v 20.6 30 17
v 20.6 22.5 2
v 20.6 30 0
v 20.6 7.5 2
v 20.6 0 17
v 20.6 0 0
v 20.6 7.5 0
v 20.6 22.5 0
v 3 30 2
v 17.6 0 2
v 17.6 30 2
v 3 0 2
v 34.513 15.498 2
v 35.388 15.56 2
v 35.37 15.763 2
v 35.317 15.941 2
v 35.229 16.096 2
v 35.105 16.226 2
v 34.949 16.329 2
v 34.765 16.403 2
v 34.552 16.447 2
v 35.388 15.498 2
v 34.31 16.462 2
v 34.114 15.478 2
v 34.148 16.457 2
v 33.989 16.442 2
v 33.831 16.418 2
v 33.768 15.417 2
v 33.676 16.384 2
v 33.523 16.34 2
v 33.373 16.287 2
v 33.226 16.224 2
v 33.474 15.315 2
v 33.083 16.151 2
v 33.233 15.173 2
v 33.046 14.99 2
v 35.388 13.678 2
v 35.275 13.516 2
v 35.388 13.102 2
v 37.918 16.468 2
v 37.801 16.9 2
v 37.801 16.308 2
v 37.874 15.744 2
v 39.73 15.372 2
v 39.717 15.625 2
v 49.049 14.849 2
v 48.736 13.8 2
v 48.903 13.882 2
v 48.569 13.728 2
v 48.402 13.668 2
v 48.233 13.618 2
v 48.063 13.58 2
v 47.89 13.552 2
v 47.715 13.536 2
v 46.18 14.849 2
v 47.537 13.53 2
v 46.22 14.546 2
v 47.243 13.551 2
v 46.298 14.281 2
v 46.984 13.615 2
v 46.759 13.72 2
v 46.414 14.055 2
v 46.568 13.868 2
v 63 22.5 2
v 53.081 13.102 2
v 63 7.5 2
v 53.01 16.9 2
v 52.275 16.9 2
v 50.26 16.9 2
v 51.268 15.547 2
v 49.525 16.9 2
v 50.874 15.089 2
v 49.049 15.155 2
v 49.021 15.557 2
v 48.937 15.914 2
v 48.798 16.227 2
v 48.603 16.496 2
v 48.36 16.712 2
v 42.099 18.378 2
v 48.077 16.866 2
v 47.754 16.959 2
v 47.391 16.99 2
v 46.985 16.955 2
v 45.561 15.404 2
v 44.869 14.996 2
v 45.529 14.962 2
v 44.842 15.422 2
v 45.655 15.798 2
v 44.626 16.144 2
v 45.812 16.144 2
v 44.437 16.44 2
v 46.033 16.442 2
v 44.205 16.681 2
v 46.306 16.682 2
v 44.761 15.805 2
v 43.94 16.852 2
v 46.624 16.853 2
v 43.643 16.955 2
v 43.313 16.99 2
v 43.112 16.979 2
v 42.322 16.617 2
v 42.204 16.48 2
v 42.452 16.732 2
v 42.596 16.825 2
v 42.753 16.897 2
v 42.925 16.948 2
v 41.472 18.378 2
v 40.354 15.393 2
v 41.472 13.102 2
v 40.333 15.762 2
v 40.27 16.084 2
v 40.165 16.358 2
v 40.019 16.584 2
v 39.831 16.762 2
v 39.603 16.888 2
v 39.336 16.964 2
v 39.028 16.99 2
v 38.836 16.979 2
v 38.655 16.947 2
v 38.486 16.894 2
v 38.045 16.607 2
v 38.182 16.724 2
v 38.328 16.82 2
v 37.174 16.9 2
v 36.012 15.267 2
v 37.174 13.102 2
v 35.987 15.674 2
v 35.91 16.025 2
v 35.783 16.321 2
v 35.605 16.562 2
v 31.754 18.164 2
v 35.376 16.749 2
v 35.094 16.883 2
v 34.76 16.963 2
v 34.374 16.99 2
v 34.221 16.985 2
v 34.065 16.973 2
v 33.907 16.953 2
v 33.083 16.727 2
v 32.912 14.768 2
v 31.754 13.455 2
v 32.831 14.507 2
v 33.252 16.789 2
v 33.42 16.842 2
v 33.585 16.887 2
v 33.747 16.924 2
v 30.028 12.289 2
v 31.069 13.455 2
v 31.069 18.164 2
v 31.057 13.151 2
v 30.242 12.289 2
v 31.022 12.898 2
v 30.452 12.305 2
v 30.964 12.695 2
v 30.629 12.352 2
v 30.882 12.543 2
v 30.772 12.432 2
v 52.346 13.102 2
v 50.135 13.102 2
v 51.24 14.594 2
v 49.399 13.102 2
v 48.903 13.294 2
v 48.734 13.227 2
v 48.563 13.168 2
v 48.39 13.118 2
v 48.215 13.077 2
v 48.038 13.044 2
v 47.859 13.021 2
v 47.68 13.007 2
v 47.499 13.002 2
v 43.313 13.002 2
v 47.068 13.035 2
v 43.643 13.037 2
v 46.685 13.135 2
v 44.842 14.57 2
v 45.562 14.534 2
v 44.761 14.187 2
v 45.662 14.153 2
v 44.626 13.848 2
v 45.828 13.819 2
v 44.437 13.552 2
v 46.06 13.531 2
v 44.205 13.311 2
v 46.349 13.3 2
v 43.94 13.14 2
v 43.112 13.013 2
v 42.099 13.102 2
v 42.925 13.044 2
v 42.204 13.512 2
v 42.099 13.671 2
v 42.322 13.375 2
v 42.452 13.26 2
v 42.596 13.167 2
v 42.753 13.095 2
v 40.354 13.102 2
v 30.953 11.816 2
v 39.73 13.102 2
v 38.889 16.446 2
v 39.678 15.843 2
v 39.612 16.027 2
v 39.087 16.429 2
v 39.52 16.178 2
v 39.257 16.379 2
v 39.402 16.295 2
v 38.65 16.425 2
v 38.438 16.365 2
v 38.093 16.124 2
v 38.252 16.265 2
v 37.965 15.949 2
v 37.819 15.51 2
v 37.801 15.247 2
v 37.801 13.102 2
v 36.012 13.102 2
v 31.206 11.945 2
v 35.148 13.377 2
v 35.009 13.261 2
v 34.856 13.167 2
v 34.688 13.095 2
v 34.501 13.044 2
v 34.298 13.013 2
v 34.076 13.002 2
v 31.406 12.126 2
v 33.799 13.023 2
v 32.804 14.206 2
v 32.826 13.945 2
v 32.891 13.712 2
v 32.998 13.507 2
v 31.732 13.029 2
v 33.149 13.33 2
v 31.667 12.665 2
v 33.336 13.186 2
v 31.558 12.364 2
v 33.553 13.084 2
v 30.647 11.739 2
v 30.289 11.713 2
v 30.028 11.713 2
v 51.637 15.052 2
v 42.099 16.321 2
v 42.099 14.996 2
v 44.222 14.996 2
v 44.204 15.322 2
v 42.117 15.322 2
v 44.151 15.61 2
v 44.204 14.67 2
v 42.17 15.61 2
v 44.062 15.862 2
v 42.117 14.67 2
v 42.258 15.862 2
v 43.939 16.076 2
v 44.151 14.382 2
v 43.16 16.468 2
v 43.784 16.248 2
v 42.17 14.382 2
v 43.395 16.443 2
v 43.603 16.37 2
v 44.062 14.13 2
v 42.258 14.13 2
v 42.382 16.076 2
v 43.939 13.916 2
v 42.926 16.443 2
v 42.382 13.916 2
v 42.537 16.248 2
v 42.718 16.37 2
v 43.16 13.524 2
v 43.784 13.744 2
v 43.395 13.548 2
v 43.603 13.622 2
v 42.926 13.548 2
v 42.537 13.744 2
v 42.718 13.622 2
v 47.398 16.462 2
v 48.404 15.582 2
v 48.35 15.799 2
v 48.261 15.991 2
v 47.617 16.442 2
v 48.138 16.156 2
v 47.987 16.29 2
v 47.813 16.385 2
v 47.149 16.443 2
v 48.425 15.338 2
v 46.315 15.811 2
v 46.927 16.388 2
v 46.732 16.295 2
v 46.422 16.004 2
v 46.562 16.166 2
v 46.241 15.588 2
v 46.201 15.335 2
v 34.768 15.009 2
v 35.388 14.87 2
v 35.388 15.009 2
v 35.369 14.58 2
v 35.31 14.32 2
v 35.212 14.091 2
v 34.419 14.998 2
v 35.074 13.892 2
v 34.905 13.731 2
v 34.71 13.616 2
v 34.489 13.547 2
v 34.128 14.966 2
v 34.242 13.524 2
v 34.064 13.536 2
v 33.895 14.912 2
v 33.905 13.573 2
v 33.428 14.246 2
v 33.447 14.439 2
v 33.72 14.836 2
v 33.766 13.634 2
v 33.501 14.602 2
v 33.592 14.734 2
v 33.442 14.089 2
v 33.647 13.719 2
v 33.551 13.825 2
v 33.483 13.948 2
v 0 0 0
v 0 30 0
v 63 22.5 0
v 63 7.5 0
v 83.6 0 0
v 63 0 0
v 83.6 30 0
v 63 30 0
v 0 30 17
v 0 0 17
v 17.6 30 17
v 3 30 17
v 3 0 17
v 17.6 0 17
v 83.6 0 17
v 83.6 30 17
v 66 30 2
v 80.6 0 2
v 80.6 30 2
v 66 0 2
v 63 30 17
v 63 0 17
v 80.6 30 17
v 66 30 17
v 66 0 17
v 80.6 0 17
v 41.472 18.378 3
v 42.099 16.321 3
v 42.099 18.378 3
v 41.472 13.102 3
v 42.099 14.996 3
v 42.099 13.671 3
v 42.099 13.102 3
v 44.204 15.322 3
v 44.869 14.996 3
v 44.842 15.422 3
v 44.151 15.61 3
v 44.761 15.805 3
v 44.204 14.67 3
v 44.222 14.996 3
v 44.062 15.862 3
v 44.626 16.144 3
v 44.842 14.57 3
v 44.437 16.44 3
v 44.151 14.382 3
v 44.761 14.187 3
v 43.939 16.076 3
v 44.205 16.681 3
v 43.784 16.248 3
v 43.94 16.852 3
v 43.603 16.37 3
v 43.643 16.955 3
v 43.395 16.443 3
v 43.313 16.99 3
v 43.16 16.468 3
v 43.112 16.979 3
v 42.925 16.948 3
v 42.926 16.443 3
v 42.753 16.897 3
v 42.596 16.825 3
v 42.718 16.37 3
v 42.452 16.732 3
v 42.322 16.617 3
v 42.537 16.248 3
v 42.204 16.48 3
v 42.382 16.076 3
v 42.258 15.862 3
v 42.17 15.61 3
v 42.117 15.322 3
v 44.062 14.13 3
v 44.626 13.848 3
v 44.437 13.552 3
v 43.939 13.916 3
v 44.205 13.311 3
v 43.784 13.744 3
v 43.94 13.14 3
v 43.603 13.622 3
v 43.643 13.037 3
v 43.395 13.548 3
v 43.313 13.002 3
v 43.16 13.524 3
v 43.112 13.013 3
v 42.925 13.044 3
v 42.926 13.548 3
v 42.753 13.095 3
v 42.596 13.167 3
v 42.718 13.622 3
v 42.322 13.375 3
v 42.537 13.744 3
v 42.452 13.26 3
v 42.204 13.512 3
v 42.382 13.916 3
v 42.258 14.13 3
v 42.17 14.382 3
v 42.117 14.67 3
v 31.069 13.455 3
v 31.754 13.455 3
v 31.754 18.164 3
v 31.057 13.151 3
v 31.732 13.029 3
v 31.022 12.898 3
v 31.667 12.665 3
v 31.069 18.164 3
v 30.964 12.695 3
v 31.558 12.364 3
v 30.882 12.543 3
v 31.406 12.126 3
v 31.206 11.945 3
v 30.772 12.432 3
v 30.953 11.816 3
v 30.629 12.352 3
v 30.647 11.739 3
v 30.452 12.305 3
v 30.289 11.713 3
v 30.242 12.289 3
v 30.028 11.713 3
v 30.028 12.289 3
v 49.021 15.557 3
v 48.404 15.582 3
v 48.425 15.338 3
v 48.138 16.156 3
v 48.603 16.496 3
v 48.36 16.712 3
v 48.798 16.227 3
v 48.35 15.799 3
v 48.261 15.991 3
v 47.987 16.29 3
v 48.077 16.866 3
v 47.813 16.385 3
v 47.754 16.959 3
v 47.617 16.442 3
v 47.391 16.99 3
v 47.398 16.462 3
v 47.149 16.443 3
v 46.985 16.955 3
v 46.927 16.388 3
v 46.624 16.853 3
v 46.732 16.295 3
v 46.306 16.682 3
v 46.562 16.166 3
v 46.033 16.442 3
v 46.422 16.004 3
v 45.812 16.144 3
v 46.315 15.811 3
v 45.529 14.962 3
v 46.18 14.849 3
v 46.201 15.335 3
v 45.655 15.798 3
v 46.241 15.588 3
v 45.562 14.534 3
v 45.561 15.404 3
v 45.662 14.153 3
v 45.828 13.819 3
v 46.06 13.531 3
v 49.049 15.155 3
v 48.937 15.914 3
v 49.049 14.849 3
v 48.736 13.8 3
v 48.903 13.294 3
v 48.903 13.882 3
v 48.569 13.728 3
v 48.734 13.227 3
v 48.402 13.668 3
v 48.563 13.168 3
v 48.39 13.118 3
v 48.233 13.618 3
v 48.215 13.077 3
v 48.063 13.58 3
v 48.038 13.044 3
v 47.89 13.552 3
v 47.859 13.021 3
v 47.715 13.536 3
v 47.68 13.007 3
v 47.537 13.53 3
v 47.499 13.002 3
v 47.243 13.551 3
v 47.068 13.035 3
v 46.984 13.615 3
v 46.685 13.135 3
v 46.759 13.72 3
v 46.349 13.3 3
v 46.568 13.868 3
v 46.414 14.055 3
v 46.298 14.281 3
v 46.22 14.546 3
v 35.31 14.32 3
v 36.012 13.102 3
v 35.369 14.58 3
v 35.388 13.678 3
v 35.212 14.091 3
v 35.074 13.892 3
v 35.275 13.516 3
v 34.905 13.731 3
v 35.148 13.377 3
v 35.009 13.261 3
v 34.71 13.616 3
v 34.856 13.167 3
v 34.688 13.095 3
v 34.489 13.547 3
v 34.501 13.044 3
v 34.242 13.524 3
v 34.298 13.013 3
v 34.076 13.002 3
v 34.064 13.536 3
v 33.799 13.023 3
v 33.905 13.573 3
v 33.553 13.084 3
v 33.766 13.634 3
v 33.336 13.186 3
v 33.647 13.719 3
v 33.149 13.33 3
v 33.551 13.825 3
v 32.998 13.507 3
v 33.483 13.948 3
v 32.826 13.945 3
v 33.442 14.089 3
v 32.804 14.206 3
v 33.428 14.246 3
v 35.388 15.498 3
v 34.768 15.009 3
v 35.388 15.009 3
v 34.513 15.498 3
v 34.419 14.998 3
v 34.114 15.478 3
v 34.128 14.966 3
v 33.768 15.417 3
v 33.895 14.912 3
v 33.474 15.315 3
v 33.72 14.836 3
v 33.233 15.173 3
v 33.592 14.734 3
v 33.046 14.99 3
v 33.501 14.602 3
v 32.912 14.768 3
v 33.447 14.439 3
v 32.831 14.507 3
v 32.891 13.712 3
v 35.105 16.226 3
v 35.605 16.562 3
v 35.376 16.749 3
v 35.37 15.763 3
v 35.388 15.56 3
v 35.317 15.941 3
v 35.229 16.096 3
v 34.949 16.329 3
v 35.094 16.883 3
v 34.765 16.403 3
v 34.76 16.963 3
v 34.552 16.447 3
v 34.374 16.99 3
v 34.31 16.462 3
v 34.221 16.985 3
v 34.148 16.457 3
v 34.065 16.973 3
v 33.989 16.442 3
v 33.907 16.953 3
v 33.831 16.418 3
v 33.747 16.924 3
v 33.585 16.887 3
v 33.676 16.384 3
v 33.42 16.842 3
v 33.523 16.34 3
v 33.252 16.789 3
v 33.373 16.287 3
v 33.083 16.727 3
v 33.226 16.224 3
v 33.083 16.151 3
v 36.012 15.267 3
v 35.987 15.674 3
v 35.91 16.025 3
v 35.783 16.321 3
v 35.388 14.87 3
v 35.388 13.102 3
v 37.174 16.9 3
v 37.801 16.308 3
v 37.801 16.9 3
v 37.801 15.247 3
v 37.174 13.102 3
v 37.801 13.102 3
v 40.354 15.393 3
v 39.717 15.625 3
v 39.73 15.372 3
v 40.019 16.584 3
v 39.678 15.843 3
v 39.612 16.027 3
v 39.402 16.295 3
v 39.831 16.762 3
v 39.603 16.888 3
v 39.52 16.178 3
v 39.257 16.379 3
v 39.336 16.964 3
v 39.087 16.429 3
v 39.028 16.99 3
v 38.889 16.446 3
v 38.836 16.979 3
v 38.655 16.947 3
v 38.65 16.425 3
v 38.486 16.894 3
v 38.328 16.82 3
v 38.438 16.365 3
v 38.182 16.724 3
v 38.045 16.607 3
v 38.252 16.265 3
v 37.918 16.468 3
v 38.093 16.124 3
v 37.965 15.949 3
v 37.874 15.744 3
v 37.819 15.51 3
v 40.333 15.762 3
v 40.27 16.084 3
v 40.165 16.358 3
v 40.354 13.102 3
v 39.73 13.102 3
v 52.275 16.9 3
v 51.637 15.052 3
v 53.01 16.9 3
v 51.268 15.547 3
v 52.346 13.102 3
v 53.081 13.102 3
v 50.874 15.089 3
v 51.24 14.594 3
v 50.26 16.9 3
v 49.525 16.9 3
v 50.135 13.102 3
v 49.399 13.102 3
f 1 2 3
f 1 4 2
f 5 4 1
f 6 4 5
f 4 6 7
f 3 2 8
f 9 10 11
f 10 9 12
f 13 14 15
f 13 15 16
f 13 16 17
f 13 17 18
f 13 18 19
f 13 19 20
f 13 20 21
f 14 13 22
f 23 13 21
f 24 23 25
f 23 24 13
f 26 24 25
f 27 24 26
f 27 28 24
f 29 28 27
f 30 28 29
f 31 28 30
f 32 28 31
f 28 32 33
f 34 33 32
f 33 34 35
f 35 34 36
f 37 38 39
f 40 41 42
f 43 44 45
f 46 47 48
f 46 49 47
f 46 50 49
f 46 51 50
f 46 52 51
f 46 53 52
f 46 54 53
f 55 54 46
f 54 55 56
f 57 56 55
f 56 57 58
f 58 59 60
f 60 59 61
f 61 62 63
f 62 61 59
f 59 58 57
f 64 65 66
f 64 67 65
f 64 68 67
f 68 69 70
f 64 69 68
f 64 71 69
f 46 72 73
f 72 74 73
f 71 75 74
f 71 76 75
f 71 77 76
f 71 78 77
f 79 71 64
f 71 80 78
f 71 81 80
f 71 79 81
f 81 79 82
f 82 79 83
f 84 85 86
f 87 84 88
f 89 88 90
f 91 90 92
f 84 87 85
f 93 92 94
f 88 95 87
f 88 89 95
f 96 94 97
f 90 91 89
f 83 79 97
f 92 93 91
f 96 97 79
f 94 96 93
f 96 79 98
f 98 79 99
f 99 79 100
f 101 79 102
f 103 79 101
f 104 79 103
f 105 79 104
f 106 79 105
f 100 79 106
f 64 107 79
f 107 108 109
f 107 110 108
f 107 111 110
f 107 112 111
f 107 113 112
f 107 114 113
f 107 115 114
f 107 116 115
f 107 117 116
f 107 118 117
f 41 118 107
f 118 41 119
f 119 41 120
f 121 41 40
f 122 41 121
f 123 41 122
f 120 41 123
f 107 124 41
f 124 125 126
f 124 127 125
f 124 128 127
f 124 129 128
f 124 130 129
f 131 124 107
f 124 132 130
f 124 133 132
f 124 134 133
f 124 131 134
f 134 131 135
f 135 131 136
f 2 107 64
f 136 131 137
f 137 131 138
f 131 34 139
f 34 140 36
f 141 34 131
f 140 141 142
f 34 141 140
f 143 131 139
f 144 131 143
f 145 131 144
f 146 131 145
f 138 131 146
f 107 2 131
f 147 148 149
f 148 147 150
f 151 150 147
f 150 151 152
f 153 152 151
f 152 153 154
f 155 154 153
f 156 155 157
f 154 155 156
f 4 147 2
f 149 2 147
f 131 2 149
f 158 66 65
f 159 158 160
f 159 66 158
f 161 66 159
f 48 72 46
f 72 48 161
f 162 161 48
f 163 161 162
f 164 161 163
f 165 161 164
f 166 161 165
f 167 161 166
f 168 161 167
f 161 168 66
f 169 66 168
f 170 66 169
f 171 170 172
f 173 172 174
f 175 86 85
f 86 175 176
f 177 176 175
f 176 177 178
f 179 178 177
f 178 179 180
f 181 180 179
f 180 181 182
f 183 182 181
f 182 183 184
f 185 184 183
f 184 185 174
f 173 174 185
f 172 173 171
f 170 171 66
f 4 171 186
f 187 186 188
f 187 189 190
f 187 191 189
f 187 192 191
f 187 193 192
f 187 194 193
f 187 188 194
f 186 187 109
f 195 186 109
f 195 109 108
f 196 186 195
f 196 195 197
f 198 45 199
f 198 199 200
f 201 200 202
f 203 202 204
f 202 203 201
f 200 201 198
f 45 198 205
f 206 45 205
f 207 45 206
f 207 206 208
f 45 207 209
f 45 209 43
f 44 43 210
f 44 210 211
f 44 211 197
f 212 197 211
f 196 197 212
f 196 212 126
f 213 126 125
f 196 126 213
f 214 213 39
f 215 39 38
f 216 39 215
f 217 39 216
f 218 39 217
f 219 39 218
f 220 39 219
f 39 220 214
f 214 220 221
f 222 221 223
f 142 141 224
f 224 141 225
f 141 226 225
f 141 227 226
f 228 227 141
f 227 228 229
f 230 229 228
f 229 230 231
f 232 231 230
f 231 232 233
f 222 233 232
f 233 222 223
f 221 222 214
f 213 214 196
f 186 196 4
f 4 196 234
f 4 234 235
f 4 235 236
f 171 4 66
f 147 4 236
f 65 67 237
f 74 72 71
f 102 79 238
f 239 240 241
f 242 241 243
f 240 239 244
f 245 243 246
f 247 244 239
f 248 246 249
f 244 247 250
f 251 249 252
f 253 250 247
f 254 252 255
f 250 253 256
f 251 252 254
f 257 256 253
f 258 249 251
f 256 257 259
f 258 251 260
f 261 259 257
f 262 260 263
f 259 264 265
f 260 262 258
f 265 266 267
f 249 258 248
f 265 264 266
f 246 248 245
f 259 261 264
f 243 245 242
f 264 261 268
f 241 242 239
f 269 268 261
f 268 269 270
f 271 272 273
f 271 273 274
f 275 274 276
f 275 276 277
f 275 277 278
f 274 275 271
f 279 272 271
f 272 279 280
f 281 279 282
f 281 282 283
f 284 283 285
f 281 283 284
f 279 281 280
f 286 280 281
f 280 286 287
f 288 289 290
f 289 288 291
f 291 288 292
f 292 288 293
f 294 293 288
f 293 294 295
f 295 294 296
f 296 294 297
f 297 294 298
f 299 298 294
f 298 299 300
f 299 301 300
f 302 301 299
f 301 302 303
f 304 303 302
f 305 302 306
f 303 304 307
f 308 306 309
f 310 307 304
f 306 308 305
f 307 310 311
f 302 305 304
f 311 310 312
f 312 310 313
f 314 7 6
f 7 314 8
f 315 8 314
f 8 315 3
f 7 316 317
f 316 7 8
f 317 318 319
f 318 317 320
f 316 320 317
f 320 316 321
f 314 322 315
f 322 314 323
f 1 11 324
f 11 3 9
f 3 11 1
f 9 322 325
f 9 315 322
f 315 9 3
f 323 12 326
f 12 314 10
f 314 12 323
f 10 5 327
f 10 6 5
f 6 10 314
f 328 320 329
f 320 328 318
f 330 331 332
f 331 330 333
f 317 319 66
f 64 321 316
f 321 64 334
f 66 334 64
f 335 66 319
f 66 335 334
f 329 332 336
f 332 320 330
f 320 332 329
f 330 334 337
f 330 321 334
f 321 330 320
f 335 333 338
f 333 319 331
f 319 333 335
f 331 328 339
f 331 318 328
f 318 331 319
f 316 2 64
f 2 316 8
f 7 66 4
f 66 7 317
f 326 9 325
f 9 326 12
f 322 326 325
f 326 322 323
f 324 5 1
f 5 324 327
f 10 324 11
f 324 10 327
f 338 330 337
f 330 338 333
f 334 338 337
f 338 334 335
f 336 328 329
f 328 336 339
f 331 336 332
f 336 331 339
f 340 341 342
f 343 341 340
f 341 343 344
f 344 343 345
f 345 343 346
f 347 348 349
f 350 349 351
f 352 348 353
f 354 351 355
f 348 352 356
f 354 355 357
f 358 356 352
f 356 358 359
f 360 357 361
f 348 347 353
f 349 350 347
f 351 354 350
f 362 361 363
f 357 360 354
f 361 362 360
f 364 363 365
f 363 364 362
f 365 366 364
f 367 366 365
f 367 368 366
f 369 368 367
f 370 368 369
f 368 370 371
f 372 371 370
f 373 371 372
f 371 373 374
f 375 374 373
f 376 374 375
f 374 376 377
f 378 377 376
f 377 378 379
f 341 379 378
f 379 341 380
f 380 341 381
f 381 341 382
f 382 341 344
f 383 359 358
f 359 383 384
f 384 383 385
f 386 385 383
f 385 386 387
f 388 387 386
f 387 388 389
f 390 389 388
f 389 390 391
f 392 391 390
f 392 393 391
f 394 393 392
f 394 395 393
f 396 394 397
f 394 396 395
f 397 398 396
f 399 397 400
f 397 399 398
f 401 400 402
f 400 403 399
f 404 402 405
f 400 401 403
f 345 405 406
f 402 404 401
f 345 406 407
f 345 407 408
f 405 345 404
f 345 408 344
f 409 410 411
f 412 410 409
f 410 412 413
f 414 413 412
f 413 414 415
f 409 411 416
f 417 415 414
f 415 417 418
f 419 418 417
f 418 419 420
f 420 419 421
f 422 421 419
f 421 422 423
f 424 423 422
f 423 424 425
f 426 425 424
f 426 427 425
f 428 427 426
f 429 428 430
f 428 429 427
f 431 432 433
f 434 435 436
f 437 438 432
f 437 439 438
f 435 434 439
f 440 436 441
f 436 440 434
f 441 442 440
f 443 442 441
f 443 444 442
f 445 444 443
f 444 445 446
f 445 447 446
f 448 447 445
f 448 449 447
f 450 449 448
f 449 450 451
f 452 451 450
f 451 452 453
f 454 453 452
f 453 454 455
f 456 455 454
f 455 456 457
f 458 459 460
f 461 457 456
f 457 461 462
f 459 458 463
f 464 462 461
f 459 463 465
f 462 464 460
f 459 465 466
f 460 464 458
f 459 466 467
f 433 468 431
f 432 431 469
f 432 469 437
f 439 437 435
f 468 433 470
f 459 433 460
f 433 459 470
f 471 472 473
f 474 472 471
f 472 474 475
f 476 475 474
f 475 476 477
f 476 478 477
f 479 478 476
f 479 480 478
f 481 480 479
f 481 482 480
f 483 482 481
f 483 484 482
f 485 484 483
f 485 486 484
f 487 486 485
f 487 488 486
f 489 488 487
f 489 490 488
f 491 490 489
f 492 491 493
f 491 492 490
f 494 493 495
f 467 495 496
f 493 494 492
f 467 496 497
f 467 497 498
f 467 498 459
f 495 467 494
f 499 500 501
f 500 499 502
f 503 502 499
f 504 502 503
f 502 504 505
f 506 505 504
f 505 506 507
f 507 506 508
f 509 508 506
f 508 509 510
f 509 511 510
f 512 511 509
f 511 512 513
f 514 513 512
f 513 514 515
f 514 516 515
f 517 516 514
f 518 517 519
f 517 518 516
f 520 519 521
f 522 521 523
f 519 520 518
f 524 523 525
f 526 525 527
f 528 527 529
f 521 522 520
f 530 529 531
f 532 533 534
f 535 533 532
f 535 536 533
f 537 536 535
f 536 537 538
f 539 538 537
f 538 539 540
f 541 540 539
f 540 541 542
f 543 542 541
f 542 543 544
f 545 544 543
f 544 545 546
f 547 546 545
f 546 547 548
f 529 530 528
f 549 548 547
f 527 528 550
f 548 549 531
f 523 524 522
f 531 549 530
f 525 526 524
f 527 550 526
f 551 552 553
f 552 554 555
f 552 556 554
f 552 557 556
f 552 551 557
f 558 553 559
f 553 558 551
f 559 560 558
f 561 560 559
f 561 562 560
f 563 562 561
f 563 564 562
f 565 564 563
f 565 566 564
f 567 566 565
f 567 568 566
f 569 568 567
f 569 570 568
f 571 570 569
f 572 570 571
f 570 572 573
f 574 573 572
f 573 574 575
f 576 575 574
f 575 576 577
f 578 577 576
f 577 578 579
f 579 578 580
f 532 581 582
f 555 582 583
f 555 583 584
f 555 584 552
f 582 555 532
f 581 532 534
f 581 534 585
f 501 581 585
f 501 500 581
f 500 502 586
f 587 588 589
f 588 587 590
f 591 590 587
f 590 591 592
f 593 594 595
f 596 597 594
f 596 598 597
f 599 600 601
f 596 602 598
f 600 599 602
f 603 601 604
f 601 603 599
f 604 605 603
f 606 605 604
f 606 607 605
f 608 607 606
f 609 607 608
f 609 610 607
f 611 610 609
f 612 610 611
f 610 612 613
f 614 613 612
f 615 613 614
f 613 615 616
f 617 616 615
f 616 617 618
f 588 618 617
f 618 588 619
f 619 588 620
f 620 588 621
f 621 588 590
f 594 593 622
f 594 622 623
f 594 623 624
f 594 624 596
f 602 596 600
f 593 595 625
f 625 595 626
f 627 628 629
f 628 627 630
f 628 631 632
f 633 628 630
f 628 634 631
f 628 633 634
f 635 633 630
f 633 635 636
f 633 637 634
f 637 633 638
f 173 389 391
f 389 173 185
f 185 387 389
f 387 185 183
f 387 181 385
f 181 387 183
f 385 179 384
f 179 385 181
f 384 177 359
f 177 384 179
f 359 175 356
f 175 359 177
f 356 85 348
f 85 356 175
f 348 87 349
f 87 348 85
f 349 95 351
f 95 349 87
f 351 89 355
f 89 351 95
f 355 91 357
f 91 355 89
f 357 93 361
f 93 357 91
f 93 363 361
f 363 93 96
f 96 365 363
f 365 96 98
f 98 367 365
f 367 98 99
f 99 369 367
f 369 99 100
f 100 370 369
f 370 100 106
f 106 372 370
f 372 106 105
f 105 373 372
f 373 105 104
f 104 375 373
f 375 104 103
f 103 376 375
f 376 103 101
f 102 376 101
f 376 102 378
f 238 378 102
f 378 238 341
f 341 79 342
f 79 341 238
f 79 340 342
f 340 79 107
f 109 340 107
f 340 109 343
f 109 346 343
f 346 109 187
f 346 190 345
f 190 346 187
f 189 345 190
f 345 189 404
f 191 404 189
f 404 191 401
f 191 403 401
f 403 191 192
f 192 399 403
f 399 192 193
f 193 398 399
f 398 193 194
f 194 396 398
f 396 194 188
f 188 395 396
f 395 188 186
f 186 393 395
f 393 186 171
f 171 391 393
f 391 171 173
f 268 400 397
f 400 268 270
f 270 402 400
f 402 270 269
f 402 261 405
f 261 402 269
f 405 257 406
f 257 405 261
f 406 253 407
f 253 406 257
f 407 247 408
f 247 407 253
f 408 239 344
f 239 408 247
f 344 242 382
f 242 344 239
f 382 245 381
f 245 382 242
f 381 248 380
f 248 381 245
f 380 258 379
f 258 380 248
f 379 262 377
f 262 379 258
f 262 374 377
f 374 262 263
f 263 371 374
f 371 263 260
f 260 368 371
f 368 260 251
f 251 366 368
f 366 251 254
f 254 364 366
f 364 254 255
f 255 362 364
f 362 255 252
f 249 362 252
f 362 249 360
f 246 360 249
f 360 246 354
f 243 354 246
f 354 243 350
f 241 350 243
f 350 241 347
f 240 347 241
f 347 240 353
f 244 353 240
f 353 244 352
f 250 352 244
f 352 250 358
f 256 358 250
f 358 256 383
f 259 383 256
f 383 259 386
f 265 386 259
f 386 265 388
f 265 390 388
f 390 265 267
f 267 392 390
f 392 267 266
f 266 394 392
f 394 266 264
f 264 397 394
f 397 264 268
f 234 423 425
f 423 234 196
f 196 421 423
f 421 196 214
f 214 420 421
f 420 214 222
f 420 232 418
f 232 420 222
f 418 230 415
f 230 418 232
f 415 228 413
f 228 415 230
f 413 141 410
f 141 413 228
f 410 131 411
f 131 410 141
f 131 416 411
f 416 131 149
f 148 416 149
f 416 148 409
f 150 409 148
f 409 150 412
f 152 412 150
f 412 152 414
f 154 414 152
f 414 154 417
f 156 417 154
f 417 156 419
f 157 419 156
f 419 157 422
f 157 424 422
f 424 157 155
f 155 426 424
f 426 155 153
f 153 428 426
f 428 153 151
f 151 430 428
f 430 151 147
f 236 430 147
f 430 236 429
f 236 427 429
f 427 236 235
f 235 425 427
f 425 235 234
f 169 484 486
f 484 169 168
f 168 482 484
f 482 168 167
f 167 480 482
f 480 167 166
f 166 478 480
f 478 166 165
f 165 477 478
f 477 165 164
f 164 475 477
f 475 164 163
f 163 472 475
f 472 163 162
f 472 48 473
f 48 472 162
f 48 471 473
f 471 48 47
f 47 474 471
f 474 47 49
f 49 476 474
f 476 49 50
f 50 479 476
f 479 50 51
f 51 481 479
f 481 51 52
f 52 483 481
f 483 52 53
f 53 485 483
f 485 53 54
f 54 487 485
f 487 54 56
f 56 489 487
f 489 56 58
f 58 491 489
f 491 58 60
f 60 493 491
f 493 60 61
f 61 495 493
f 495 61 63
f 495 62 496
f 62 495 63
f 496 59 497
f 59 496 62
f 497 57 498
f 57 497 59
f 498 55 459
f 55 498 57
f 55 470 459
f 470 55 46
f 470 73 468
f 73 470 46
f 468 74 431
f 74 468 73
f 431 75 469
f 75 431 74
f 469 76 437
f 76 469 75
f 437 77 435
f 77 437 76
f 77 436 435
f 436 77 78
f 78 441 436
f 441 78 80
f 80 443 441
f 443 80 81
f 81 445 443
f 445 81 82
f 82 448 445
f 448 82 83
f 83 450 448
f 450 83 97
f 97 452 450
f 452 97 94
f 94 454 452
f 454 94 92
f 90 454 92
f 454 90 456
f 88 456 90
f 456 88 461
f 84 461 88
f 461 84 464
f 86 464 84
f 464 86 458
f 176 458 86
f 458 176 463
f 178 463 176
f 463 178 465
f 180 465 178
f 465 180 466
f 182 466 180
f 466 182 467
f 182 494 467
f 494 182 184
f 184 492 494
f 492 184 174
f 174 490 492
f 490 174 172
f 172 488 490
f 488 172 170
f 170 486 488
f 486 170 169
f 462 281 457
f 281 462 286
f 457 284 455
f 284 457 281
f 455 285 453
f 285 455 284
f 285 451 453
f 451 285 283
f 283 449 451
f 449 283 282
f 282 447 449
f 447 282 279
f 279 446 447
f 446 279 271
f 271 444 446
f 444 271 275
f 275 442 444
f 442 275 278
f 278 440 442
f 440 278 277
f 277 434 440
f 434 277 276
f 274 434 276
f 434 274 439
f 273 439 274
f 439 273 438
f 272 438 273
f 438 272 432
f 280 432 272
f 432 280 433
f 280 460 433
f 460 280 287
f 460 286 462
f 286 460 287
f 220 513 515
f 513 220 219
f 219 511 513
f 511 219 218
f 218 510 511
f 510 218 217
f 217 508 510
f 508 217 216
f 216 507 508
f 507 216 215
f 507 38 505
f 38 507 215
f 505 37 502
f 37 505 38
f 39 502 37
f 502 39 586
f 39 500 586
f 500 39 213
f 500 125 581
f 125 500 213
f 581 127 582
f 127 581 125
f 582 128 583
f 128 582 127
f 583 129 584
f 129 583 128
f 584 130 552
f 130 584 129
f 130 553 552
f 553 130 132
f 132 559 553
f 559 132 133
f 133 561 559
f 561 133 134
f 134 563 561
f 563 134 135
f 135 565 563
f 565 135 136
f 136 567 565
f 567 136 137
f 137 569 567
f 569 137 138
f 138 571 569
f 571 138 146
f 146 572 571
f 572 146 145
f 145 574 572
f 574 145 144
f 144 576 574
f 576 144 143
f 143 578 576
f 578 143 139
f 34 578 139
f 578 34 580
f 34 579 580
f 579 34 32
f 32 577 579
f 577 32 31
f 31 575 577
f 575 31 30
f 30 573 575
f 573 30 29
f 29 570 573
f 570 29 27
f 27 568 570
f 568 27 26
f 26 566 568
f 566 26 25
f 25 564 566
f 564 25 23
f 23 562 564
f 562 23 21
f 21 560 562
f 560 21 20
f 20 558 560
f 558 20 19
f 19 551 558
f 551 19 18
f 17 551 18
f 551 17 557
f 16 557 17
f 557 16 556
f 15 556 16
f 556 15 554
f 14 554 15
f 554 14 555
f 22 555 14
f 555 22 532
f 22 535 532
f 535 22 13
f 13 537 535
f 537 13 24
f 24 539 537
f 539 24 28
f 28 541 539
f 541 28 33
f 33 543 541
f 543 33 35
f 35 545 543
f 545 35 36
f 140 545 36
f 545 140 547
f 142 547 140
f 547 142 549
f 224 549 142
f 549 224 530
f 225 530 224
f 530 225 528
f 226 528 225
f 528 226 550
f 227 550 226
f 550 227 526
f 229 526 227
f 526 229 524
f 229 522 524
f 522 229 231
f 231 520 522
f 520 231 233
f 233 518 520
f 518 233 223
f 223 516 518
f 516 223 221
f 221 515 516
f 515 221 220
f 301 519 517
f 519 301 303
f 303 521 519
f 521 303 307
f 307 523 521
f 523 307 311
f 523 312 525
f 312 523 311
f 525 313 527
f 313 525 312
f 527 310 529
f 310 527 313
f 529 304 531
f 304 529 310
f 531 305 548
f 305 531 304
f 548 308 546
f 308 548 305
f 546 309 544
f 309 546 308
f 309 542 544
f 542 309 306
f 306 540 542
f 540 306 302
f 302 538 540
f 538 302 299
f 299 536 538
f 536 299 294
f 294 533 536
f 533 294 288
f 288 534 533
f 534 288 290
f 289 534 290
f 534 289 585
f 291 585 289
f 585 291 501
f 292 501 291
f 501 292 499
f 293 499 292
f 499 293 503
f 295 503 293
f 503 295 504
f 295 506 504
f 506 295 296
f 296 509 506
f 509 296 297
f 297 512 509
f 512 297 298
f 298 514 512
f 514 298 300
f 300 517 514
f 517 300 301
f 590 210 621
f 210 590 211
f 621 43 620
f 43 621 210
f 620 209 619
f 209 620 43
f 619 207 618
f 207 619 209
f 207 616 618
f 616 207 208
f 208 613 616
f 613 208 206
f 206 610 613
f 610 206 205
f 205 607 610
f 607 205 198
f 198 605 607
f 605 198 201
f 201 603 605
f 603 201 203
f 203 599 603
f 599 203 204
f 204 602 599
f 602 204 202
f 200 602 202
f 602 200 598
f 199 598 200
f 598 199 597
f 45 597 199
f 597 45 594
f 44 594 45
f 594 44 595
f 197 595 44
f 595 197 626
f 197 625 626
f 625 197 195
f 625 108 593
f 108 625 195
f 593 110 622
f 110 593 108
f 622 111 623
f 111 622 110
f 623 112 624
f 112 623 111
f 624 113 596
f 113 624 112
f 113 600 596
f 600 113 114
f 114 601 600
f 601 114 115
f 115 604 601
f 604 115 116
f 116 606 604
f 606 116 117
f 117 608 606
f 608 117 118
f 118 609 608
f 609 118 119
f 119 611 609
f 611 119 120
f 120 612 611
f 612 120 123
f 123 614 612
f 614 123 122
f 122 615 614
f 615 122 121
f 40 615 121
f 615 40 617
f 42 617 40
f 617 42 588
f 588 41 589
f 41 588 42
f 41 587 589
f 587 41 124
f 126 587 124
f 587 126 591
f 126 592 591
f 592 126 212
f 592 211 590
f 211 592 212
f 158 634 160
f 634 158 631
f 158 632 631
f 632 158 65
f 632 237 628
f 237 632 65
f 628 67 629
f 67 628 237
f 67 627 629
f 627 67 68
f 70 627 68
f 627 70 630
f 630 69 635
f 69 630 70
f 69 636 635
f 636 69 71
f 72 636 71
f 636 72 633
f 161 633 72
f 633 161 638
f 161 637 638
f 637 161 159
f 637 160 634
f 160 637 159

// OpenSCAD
/* [Spacer] */

// fineness($fn)
Feinheit=30; // [30:100]

// width block
Breite_Block = 20.6;

// depth block
Tiefe_Block = 30;

// depth connector
Tiefe_Verbindung = 15;

// height footprint
Hoehe_Grundflaeche = 2;

// distance
Abstand = 63;

// thickness wall
Dicke_Wand = 3;

// height wall
Hoehe_Wand = 15;
Text = "Janbex";

// font
Schriftart="Roboto"; 

// fontsize
Schriftgroesse=5; // [2:25]

// font spacing
Buchstaben_Abstand=1; // [1:0.1:3]

/* [hidden] */
$fn=Feinheit;
    
{
Breite_Verbindung = Abstand-Breite_Block;
}


{
cube([Breite_Block,Tiefe_Block,Hoehe_Grundflaeche]);
translate([Breite_Block+Breite_Verbindung,0,0]) cube([Breite_Block,Tiefe_Block,Hoehe_Grundflaeche]);
translate([Breite_Block,Tiefe_Block/2-Tiefe_Verbindung/2,0]) cube([Breite_Verbindung,Tiefe_Verbindung,Hoehe_Grundflaeche]);
translate([0,0,Hoehe_Grundflaeche]) cube([Dicke_Wand,Tiefe_Block,Hoehe_Wand]);
translate([Breite_Block-Dicke_Wand,0,Hoehe_Grundflaeche]) cube([Dicke_Wand,Tiefe_Block,Hoehe_Wand]);
translate([Breite_Block+Breite_Verbindung,0,Hoehe_Grundflaeche]) cube([Dicke_Wand,Tiefe_Block,Hoehe_Wand]);
translate([Breite_Block+Breite_Verbindung+Breite_Block-Dicke_Wand,0,Hoehe_Grundflaeche]) cube([Dicke_Wand,Tiefe_Block,Hoehe_Wand]);
}
translate([Breite_Block+Breite_Verbindung/2,Tiefe_Block/2,Hoehe_Grundflaeche]) linear_extrude(1) text(Text,size=Schriftgroesse,font=Schriftart,halign="center",valign="center",spacing=Buchstaben_Abstand);
